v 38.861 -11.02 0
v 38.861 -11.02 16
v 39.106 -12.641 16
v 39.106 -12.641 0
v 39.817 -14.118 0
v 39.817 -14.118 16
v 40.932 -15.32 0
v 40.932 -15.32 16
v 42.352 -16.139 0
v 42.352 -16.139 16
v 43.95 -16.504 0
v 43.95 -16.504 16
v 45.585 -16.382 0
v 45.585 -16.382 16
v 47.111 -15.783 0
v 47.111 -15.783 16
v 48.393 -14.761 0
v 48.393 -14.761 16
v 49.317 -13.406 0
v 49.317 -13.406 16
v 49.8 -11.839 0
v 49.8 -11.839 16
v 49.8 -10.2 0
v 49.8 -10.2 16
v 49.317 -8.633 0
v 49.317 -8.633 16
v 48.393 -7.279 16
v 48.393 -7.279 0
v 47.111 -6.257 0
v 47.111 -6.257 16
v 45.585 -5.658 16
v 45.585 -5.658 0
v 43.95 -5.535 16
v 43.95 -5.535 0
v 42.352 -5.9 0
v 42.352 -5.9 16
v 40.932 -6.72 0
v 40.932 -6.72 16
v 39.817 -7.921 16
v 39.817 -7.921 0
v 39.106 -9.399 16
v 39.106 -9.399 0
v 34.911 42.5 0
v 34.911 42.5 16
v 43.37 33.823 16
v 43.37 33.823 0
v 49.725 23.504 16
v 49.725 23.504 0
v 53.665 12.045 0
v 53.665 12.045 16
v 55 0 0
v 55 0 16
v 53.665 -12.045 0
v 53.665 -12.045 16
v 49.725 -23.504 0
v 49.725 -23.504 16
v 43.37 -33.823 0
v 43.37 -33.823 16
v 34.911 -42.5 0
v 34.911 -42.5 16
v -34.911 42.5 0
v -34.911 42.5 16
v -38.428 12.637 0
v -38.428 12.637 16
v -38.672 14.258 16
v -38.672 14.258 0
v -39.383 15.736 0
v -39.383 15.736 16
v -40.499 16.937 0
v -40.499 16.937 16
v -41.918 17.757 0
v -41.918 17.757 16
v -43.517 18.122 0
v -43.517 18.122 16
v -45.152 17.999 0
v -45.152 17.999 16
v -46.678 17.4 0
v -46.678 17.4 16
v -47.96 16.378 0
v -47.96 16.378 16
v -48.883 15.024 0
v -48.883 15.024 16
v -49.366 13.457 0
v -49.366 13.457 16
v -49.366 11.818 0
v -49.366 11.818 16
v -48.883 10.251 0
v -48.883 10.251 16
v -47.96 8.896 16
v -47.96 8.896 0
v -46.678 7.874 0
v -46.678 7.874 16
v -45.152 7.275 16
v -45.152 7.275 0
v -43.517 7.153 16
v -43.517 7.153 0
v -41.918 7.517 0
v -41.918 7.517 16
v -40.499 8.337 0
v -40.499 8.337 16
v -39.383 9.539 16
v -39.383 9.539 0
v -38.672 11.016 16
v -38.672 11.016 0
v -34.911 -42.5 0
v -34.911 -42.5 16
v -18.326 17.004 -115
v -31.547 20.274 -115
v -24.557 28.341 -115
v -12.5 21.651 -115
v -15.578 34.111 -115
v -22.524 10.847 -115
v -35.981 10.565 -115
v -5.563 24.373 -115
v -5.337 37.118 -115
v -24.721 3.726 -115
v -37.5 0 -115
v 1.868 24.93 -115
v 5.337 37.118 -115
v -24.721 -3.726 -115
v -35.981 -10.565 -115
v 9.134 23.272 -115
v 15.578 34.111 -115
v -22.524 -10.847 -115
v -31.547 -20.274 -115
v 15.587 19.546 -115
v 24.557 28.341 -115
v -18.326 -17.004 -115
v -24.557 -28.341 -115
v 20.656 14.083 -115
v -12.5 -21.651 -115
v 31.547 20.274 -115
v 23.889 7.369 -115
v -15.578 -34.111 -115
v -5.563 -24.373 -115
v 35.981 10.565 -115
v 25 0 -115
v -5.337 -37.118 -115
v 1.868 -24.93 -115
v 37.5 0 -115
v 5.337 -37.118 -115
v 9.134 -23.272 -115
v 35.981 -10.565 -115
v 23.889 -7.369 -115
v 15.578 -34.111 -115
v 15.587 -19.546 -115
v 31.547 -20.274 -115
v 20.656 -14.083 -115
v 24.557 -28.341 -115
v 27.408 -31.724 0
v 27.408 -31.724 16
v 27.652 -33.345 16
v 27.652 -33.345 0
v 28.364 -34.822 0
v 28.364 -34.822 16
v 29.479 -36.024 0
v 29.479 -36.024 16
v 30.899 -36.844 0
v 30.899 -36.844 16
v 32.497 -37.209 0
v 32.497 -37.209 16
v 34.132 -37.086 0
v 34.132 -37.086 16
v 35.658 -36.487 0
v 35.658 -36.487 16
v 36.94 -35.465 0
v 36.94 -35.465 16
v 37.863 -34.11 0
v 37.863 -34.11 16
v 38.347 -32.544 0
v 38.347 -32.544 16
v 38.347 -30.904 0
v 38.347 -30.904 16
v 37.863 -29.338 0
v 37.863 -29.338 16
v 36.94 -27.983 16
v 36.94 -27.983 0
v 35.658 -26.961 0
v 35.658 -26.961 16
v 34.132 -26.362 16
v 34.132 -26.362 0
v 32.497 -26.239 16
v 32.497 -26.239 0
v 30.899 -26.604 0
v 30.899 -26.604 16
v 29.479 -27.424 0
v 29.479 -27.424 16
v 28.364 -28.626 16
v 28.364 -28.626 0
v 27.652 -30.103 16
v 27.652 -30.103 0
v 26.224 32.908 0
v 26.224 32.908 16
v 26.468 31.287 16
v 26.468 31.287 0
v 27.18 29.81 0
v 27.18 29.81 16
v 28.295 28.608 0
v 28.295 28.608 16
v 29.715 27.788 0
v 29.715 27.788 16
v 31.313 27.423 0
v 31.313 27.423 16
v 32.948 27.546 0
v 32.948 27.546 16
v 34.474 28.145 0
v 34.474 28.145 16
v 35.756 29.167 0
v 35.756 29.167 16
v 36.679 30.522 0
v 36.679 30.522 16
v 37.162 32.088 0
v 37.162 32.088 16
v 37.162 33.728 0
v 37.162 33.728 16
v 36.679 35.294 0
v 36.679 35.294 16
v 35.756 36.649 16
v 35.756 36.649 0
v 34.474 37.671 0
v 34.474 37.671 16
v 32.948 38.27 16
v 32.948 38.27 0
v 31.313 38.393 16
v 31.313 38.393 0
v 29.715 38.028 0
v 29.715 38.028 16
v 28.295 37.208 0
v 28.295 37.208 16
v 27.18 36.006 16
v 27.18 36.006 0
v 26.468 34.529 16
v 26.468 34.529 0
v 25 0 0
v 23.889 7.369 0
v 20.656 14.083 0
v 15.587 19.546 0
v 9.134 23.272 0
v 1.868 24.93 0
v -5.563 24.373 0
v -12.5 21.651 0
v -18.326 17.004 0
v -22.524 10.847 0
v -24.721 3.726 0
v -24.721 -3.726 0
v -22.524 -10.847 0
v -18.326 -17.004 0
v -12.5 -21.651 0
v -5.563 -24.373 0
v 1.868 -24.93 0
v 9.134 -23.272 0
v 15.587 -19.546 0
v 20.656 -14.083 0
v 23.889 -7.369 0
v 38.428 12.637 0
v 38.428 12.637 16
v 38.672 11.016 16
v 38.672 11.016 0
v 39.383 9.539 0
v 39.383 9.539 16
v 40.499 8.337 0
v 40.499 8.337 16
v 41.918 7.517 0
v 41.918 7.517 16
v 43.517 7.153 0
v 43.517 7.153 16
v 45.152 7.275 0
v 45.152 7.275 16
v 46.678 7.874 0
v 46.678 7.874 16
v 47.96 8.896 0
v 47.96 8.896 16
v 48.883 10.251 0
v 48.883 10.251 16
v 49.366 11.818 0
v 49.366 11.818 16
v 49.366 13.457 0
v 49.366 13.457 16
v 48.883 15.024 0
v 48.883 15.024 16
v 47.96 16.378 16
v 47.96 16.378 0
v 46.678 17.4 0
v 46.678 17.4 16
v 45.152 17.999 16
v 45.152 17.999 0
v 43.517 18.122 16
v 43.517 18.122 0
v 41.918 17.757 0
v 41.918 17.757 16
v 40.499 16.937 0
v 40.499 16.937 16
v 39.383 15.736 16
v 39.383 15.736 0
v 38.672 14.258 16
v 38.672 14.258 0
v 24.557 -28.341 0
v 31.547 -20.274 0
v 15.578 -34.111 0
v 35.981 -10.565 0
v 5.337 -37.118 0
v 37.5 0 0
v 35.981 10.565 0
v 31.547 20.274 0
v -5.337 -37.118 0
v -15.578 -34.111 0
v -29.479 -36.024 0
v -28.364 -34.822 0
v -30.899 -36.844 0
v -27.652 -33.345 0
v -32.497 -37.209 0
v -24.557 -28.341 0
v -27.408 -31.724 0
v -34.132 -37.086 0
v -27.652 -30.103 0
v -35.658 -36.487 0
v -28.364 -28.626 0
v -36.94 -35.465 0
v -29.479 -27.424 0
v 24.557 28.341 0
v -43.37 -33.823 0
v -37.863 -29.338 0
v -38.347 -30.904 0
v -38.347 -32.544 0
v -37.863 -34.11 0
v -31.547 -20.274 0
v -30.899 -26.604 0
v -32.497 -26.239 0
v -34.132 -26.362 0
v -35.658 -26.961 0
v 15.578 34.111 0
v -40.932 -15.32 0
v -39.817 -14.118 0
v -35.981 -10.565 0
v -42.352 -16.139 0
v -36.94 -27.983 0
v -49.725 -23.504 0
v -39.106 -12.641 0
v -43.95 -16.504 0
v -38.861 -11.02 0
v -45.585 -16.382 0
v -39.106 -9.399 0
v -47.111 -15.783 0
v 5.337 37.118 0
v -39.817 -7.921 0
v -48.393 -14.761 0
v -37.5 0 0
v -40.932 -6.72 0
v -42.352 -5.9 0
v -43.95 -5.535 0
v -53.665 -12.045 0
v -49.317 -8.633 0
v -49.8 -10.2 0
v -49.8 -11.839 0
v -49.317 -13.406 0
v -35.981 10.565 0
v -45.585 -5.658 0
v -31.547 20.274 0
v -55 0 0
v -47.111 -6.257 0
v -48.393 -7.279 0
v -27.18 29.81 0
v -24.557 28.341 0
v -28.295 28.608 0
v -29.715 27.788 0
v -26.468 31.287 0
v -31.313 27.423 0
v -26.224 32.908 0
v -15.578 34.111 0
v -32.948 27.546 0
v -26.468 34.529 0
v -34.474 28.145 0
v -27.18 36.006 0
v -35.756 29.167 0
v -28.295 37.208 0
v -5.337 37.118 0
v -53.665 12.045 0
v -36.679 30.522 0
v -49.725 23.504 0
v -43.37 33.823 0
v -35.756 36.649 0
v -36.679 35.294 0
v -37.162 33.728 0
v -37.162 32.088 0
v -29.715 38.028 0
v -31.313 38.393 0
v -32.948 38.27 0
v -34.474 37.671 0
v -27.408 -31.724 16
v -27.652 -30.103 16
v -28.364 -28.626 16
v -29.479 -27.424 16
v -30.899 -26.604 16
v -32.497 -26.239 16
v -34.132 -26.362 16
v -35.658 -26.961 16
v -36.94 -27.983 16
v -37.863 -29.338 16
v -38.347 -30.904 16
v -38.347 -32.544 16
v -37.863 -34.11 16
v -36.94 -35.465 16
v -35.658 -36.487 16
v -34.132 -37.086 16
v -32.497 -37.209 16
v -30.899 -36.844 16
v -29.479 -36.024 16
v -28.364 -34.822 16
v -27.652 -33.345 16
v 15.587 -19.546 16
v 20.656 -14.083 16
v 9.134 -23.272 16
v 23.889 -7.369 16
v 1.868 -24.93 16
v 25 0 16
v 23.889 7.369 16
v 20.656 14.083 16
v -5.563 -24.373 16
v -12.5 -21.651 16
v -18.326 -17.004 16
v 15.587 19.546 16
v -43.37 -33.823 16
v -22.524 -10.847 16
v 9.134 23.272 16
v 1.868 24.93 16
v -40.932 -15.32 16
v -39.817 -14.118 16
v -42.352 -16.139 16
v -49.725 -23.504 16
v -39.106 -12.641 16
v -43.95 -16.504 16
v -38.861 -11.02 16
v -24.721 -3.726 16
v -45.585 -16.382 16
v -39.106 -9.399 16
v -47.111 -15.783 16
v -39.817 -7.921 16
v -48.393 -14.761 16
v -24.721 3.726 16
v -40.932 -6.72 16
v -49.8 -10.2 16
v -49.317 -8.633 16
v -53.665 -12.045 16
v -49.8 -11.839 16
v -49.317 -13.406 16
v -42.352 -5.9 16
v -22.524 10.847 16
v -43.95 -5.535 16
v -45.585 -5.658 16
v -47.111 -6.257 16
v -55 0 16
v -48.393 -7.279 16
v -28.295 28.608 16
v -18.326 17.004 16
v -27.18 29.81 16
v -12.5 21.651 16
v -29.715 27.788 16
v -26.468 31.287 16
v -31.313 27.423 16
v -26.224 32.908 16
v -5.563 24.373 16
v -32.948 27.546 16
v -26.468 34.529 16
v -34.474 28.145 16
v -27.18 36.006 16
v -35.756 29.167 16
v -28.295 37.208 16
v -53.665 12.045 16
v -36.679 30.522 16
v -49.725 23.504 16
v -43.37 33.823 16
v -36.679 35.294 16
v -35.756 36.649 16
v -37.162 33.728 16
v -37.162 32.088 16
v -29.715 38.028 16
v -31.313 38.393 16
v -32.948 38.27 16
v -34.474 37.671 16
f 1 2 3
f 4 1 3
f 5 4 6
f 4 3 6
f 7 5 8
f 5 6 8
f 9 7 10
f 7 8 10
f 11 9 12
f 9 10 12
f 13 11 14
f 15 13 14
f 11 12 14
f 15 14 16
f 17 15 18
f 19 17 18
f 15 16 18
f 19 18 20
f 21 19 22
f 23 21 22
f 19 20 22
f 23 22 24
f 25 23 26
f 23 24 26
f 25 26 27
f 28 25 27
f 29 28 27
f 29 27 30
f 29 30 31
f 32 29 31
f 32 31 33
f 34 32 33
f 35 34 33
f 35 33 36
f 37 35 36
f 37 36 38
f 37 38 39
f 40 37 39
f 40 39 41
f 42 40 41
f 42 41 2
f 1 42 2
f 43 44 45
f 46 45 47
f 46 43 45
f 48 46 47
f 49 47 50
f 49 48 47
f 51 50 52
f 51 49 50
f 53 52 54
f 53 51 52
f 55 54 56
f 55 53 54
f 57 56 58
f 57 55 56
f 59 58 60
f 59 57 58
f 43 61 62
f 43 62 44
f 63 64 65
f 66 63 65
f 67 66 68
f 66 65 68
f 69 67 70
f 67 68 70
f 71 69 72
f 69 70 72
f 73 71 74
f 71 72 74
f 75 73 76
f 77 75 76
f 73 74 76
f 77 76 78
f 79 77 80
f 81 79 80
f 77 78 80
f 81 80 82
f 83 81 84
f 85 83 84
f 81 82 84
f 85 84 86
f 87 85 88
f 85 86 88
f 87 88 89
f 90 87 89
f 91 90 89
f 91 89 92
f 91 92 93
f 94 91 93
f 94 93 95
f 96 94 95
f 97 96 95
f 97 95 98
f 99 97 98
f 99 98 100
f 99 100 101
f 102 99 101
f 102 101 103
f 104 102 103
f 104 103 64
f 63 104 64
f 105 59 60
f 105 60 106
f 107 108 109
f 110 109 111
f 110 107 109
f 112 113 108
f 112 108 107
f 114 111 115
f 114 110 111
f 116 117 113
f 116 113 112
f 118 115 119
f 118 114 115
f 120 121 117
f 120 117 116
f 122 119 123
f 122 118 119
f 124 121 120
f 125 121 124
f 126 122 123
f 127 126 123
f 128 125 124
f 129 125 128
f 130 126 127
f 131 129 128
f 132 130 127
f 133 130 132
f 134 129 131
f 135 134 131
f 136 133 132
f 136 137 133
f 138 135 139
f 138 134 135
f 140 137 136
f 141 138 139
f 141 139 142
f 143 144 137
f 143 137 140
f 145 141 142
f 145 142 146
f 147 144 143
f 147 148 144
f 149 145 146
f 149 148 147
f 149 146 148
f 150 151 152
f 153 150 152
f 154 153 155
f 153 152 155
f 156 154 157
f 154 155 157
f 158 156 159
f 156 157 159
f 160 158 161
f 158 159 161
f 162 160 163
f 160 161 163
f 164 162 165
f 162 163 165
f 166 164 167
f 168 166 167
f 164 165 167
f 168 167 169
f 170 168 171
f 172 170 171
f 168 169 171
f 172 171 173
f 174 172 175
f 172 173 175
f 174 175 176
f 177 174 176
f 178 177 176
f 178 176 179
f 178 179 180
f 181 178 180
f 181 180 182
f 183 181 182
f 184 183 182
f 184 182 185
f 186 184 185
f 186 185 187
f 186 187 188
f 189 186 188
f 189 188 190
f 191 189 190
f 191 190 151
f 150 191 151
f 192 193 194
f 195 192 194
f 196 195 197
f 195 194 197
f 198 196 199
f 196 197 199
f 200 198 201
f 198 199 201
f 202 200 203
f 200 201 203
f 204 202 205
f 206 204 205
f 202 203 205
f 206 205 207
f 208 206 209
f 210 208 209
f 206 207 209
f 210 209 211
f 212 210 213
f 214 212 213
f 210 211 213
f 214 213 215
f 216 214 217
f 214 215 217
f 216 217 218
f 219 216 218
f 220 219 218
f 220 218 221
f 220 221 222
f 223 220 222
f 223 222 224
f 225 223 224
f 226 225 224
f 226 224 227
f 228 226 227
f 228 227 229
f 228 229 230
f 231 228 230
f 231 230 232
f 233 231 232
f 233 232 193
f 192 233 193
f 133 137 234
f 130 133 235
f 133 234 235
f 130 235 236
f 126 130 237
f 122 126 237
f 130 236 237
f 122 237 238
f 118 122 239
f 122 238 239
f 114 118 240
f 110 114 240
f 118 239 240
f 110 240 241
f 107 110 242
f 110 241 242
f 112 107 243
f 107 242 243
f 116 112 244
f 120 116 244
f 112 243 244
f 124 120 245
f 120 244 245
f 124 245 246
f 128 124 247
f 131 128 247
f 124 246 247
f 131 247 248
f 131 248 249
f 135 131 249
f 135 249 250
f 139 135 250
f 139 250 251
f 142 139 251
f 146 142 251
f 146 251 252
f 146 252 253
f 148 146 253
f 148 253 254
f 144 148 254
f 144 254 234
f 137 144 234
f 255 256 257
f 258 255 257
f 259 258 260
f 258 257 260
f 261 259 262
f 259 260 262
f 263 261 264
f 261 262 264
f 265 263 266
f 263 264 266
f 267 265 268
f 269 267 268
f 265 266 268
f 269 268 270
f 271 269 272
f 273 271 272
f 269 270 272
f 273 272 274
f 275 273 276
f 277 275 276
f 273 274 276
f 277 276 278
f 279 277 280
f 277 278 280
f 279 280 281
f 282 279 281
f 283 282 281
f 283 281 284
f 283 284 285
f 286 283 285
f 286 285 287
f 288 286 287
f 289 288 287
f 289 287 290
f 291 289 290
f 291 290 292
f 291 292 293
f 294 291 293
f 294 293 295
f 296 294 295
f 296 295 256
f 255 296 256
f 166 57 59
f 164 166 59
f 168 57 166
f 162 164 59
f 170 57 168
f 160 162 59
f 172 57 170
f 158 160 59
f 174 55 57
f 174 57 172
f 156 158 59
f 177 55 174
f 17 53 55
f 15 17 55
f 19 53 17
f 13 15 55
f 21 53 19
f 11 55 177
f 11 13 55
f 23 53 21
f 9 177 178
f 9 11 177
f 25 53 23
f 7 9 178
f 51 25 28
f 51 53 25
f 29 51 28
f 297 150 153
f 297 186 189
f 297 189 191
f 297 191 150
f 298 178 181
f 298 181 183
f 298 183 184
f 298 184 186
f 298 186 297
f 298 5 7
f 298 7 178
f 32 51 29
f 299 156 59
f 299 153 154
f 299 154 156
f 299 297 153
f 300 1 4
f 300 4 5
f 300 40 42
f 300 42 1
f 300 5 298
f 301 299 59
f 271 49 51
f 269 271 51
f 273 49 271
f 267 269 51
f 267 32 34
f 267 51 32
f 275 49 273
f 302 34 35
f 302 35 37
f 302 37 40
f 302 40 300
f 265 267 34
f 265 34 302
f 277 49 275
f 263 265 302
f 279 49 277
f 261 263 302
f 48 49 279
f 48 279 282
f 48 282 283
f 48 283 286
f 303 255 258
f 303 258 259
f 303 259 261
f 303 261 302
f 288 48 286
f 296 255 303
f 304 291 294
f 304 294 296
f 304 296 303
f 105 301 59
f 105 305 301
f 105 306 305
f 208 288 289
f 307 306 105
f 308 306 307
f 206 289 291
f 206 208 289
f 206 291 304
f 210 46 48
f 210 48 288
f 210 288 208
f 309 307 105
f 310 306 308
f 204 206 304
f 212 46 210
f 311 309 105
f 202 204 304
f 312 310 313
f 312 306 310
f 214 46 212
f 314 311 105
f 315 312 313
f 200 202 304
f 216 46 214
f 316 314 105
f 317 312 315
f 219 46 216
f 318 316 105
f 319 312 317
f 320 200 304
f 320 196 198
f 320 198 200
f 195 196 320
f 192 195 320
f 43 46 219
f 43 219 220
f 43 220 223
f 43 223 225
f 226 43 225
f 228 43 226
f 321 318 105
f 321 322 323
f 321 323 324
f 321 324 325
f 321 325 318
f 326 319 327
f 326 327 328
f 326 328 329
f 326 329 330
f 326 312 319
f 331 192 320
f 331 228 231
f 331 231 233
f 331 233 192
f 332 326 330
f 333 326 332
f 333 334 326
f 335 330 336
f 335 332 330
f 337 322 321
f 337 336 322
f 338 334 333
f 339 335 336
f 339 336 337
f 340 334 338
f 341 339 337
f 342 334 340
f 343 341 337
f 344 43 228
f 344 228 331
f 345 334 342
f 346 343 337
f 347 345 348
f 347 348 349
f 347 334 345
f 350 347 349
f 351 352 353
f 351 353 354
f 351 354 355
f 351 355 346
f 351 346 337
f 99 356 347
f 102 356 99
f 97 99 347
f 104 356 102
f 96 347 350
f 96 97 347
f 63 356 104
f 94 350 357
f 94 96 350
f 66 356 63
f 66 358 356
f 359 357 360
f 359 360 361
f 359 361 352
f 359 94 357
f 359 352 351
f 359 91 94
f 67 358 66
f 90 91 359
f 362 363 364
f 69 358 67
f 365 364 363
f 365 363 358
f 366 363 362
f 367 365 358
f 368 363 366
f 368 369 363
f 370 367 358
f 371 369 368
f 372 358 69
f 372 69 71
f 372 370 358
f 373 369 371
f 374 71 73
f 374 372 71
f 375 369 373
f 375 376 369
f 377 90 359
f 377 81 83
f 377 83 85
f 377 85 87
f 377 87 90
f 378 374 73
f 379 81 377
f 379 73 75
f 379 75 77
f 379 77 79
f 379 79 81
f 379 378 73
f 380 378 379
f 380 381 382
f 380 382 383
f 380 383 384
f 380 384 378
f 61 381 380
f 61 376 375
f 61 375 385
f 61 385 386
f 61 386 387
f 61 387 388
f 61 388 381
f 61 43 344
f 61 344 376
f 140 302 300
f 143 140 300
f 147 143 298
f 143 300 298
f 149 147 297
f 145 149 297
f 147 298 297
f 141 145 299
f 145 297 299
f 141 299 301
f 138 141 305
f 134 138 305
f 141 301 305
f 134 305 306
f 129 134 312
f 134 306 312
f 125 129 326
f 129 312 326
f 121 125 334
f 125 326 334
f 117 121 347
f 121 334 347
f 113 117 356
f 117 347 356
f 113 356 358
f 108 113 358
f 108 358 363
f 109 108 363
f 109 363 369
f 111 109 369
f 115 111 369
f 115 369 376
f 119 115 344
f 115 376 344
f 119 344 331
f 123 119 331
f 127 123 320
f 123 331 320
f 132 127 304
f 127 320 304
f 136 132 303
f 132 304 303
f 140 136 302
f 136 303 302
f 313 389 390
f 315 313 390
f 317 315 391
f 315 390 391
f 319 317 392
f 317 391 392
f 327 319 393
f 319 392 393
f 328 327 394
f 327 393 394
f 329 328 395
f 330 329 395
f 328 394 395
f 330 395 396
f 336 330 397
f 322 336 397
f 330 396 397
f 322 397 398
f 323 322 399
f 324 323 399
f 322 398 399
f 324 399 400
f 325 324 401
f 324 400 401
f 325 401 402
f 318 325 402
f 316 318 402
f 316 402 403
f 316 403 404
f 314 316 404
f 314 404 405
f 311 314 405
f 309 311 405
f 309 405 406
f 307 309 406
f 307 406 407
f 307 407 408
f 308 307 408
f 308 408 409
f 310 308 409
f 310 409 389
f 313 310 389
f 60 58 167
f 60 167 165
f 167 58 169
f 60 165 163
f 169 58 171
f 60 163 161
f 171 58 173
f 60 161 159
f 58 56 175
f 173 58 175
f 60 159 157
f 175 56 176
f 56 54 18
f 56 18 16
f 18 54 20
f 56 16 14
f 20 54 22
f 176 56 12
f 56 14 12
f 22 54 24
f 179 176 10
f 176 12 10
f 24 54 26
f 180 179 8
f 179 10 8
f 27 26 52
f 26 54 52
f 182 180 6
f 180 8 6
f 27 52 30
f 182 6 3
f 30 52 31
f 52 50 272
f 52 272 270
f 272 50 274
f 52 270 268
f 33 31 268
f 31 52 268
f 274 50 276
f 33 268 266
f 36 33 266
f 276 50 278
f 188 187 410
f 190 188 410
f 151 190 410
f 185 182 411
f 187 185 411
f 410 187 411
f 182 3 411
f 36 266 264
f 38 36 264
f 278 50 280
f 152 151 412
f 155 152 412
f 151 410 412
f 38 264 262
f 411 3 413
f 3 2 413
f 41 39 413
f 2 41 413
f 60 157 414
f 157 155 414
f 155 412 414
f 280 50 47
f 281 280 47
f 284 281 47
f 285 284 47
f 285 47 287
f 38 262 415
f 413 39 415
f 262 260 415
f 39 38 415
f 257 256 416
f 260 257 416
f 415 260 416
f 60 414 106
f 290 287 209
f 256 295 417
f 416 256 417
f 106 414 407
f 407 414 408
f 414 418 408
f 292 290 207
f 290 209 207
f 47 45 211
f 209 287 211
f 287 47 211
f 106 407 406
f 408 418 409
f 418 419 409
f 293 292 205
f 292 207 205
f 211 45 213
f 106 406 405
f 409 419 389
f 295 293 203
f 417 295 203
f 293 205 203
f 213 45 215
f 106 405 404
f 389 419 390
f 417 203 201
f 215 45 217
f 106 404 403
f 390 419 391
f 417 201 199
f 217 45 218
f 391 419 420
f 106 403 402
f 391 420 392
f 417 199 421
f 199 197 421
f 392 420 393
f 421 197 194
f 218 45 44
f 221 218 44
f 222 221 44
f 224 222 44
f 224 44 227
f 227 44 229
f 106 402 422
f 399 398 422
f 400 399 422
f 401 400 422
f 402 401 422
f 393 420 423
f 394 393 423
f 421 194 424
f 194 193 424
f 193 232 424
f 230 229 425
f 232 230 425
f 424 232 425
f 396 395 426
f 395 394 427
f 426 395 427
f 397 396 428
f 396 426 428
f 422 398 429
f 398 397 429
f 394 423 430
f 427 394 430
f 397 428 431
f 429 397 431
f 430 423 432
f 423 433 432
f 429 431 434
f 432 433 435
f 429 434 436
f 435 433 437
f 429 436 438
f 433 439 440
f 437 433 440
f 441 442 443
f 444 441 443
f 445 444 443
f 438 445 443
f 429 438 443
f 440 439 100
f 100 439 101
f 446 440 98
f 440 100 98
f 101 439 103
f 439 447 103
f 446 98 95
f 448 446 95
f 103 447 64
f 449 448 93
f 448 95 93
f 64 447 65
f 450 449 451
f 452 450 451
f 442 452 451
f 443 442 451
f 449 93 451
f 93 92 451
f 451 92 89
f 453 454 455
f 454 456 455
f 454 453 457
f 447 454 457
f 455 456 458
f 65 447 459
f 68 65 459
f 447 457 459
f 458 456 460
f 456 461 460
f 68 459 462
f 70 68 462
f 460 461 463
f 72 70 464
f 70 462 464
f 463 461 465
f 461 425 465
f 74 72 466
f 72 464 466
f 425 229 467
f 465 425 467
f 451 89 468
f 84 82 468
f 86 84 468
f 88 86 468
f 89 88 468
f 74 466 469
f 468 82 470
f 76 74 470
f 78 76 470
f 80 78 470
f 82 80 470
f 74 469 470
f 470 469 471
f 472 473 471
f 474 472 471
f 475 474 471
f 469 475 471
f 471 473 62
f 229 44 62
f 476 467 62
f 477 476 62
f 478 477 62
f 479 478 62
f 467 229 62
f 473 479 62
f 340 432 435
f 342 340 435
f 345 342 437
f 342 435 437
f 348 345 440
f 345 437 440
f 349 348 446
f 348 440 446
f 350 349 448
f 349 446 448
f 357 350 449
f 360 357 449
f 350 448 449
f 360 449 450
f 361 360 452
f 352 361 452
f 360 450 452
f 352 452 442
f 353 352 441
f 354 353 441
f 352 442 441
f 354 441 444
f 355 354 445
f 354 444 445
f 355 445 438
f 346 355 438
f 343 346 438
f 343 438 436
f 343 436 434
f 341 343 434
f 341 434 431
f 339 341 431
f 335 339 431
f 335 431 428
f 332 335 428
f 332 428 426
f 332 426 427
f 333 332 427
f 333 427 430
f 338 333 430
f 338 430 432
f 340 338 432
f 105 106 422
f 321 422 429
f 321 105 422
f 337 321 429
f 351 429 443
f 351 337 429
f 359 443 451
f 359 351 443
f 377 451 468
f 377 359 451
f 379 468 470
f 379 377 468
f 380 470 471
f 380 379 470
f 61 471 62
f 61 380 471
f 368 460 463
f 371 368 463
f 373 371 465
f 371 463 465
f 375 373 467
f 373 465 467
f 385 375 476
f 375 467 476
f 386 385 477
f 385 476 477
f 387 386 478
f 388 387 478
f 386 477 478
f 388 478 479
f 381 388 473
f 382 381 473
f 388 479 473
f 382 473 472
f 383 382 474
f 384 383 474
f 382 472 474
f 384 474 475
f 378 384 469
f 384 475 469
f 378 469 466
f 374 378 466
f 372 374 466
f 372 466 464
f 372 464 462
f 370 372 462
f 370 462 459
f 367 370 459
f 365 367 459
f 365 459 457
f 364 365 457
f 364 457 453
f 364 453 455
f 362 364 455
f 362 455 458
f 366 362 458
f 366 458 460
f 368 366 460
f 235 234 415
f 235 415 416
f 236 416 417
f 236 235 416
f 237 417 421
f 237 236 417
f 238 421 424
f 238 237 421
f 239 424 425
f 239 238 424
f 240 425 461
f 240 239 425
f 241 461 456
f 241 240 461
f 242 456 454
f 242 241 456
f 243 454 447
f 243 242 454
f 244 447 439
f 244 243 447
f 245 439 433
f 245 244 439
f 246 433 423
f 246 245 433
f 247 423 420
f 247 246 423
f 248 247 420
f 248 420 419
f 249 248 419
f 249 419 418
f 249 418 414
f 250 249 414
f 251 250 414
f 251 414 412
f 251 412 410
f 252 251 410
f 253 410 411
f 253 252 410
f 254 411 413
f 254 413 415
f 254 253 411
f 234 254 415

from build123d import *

# Parameters (mm, degrees)
SKETCH_1_R          = 25
EXTRUDE_1_DEPTH     = 16
SKETCH_2_R          = 5.5
CUT_EXTRUDE_1_DEPTH = 72.324960568
SKETCH_3_R          = 37.5
EXTRUDE_2_DEPTH     = 115
SKETCH_4_R          = 25
CUT_EXTRUDE_2_DEPTH = 135.373546504


with BuildPart() as part:
    # 草图1 → 凸台-拉伸1 (new body)
    with BuildSketch(Plane.XY):
        with BuildLine():
            Line((-34.910600109, 42.5), (34.910600109, 42.5))
            ThreePointArc((34.910600109, 42.5), (55, 0), (34.910600109, -42.5))
            Line((34.910600109, -42.5), (-34.910600109, -42.5))
            ThreePointArc((-34.910600109, -42.5), (-55, 0), (-34.910600109, 42.5))
        make_face()
        Circle(SKETCH_1_R, mode=Mode.SUBTRACT)
    extrude(amount=EXTRUDE_1_DEPTH)

    # 草图2 → 切除-拉伸1 (cut, through all)
    with BuildSketch(Plane.XY.offset(16)):
        with Locations((-31.723911196, 32.908104345)):
            Circle(SKETCH_2_R)
        with Locations((-43.927765176, 12.637298755)):
            Circle(SKETCH_2_R)
        with Locations((-44.361209952, -11.019660831)):
            Circle(SKETCH_2_R)
        with Locations((-32.908104345, -31.723911196)):
            Circle(SKETCH_2_R)
        with Locations(Location((32.908104345, -31.723911196, 0), (0, 0, 180))):
            Circle(SKETCH_2_R)
        with Locations(Location((44.361209952, -11.019660831, 0), (0, 0, 180))):
            Circle(SKETCH_2_R)
        with Locations(Location((43.927765176, 12.637298755, 0), (0, 0, 180))):
            Circle(SKETCH_2_R)
        with Locations(Location((31.723911196, 32.908104345, 0), (0, 0, 180))):
            Circle(SKETCH_2_R)
    extrude(amount=-CUT_EXTRUDE_1_DEPTH, mode=Mode.SUBTRACT)

    # 草图3 → 凸台-拉伸2 (add)
    with BuildSketch(Plane(origin=(0, 0, 0), x_dir=(-1, 0, 0), z_dir=(0, 0, -1))):
        with Locations(Location((0, 0, 0), (0, 0, 180))):
            Circle(SKETCH_3_R)
    extrude(amount=EXTRUDE_2_DEPTH)

    # 草图4 → 切除-拉伸2 (cut, through all)
    with BuildSketch(Plane.XY):
        Circle(SKETCH_4_R)
    extrude(amount=-CUT_EXTRUDE_2_DEPTH, mode=Mode.SUBTRACT)


solid = part.part
